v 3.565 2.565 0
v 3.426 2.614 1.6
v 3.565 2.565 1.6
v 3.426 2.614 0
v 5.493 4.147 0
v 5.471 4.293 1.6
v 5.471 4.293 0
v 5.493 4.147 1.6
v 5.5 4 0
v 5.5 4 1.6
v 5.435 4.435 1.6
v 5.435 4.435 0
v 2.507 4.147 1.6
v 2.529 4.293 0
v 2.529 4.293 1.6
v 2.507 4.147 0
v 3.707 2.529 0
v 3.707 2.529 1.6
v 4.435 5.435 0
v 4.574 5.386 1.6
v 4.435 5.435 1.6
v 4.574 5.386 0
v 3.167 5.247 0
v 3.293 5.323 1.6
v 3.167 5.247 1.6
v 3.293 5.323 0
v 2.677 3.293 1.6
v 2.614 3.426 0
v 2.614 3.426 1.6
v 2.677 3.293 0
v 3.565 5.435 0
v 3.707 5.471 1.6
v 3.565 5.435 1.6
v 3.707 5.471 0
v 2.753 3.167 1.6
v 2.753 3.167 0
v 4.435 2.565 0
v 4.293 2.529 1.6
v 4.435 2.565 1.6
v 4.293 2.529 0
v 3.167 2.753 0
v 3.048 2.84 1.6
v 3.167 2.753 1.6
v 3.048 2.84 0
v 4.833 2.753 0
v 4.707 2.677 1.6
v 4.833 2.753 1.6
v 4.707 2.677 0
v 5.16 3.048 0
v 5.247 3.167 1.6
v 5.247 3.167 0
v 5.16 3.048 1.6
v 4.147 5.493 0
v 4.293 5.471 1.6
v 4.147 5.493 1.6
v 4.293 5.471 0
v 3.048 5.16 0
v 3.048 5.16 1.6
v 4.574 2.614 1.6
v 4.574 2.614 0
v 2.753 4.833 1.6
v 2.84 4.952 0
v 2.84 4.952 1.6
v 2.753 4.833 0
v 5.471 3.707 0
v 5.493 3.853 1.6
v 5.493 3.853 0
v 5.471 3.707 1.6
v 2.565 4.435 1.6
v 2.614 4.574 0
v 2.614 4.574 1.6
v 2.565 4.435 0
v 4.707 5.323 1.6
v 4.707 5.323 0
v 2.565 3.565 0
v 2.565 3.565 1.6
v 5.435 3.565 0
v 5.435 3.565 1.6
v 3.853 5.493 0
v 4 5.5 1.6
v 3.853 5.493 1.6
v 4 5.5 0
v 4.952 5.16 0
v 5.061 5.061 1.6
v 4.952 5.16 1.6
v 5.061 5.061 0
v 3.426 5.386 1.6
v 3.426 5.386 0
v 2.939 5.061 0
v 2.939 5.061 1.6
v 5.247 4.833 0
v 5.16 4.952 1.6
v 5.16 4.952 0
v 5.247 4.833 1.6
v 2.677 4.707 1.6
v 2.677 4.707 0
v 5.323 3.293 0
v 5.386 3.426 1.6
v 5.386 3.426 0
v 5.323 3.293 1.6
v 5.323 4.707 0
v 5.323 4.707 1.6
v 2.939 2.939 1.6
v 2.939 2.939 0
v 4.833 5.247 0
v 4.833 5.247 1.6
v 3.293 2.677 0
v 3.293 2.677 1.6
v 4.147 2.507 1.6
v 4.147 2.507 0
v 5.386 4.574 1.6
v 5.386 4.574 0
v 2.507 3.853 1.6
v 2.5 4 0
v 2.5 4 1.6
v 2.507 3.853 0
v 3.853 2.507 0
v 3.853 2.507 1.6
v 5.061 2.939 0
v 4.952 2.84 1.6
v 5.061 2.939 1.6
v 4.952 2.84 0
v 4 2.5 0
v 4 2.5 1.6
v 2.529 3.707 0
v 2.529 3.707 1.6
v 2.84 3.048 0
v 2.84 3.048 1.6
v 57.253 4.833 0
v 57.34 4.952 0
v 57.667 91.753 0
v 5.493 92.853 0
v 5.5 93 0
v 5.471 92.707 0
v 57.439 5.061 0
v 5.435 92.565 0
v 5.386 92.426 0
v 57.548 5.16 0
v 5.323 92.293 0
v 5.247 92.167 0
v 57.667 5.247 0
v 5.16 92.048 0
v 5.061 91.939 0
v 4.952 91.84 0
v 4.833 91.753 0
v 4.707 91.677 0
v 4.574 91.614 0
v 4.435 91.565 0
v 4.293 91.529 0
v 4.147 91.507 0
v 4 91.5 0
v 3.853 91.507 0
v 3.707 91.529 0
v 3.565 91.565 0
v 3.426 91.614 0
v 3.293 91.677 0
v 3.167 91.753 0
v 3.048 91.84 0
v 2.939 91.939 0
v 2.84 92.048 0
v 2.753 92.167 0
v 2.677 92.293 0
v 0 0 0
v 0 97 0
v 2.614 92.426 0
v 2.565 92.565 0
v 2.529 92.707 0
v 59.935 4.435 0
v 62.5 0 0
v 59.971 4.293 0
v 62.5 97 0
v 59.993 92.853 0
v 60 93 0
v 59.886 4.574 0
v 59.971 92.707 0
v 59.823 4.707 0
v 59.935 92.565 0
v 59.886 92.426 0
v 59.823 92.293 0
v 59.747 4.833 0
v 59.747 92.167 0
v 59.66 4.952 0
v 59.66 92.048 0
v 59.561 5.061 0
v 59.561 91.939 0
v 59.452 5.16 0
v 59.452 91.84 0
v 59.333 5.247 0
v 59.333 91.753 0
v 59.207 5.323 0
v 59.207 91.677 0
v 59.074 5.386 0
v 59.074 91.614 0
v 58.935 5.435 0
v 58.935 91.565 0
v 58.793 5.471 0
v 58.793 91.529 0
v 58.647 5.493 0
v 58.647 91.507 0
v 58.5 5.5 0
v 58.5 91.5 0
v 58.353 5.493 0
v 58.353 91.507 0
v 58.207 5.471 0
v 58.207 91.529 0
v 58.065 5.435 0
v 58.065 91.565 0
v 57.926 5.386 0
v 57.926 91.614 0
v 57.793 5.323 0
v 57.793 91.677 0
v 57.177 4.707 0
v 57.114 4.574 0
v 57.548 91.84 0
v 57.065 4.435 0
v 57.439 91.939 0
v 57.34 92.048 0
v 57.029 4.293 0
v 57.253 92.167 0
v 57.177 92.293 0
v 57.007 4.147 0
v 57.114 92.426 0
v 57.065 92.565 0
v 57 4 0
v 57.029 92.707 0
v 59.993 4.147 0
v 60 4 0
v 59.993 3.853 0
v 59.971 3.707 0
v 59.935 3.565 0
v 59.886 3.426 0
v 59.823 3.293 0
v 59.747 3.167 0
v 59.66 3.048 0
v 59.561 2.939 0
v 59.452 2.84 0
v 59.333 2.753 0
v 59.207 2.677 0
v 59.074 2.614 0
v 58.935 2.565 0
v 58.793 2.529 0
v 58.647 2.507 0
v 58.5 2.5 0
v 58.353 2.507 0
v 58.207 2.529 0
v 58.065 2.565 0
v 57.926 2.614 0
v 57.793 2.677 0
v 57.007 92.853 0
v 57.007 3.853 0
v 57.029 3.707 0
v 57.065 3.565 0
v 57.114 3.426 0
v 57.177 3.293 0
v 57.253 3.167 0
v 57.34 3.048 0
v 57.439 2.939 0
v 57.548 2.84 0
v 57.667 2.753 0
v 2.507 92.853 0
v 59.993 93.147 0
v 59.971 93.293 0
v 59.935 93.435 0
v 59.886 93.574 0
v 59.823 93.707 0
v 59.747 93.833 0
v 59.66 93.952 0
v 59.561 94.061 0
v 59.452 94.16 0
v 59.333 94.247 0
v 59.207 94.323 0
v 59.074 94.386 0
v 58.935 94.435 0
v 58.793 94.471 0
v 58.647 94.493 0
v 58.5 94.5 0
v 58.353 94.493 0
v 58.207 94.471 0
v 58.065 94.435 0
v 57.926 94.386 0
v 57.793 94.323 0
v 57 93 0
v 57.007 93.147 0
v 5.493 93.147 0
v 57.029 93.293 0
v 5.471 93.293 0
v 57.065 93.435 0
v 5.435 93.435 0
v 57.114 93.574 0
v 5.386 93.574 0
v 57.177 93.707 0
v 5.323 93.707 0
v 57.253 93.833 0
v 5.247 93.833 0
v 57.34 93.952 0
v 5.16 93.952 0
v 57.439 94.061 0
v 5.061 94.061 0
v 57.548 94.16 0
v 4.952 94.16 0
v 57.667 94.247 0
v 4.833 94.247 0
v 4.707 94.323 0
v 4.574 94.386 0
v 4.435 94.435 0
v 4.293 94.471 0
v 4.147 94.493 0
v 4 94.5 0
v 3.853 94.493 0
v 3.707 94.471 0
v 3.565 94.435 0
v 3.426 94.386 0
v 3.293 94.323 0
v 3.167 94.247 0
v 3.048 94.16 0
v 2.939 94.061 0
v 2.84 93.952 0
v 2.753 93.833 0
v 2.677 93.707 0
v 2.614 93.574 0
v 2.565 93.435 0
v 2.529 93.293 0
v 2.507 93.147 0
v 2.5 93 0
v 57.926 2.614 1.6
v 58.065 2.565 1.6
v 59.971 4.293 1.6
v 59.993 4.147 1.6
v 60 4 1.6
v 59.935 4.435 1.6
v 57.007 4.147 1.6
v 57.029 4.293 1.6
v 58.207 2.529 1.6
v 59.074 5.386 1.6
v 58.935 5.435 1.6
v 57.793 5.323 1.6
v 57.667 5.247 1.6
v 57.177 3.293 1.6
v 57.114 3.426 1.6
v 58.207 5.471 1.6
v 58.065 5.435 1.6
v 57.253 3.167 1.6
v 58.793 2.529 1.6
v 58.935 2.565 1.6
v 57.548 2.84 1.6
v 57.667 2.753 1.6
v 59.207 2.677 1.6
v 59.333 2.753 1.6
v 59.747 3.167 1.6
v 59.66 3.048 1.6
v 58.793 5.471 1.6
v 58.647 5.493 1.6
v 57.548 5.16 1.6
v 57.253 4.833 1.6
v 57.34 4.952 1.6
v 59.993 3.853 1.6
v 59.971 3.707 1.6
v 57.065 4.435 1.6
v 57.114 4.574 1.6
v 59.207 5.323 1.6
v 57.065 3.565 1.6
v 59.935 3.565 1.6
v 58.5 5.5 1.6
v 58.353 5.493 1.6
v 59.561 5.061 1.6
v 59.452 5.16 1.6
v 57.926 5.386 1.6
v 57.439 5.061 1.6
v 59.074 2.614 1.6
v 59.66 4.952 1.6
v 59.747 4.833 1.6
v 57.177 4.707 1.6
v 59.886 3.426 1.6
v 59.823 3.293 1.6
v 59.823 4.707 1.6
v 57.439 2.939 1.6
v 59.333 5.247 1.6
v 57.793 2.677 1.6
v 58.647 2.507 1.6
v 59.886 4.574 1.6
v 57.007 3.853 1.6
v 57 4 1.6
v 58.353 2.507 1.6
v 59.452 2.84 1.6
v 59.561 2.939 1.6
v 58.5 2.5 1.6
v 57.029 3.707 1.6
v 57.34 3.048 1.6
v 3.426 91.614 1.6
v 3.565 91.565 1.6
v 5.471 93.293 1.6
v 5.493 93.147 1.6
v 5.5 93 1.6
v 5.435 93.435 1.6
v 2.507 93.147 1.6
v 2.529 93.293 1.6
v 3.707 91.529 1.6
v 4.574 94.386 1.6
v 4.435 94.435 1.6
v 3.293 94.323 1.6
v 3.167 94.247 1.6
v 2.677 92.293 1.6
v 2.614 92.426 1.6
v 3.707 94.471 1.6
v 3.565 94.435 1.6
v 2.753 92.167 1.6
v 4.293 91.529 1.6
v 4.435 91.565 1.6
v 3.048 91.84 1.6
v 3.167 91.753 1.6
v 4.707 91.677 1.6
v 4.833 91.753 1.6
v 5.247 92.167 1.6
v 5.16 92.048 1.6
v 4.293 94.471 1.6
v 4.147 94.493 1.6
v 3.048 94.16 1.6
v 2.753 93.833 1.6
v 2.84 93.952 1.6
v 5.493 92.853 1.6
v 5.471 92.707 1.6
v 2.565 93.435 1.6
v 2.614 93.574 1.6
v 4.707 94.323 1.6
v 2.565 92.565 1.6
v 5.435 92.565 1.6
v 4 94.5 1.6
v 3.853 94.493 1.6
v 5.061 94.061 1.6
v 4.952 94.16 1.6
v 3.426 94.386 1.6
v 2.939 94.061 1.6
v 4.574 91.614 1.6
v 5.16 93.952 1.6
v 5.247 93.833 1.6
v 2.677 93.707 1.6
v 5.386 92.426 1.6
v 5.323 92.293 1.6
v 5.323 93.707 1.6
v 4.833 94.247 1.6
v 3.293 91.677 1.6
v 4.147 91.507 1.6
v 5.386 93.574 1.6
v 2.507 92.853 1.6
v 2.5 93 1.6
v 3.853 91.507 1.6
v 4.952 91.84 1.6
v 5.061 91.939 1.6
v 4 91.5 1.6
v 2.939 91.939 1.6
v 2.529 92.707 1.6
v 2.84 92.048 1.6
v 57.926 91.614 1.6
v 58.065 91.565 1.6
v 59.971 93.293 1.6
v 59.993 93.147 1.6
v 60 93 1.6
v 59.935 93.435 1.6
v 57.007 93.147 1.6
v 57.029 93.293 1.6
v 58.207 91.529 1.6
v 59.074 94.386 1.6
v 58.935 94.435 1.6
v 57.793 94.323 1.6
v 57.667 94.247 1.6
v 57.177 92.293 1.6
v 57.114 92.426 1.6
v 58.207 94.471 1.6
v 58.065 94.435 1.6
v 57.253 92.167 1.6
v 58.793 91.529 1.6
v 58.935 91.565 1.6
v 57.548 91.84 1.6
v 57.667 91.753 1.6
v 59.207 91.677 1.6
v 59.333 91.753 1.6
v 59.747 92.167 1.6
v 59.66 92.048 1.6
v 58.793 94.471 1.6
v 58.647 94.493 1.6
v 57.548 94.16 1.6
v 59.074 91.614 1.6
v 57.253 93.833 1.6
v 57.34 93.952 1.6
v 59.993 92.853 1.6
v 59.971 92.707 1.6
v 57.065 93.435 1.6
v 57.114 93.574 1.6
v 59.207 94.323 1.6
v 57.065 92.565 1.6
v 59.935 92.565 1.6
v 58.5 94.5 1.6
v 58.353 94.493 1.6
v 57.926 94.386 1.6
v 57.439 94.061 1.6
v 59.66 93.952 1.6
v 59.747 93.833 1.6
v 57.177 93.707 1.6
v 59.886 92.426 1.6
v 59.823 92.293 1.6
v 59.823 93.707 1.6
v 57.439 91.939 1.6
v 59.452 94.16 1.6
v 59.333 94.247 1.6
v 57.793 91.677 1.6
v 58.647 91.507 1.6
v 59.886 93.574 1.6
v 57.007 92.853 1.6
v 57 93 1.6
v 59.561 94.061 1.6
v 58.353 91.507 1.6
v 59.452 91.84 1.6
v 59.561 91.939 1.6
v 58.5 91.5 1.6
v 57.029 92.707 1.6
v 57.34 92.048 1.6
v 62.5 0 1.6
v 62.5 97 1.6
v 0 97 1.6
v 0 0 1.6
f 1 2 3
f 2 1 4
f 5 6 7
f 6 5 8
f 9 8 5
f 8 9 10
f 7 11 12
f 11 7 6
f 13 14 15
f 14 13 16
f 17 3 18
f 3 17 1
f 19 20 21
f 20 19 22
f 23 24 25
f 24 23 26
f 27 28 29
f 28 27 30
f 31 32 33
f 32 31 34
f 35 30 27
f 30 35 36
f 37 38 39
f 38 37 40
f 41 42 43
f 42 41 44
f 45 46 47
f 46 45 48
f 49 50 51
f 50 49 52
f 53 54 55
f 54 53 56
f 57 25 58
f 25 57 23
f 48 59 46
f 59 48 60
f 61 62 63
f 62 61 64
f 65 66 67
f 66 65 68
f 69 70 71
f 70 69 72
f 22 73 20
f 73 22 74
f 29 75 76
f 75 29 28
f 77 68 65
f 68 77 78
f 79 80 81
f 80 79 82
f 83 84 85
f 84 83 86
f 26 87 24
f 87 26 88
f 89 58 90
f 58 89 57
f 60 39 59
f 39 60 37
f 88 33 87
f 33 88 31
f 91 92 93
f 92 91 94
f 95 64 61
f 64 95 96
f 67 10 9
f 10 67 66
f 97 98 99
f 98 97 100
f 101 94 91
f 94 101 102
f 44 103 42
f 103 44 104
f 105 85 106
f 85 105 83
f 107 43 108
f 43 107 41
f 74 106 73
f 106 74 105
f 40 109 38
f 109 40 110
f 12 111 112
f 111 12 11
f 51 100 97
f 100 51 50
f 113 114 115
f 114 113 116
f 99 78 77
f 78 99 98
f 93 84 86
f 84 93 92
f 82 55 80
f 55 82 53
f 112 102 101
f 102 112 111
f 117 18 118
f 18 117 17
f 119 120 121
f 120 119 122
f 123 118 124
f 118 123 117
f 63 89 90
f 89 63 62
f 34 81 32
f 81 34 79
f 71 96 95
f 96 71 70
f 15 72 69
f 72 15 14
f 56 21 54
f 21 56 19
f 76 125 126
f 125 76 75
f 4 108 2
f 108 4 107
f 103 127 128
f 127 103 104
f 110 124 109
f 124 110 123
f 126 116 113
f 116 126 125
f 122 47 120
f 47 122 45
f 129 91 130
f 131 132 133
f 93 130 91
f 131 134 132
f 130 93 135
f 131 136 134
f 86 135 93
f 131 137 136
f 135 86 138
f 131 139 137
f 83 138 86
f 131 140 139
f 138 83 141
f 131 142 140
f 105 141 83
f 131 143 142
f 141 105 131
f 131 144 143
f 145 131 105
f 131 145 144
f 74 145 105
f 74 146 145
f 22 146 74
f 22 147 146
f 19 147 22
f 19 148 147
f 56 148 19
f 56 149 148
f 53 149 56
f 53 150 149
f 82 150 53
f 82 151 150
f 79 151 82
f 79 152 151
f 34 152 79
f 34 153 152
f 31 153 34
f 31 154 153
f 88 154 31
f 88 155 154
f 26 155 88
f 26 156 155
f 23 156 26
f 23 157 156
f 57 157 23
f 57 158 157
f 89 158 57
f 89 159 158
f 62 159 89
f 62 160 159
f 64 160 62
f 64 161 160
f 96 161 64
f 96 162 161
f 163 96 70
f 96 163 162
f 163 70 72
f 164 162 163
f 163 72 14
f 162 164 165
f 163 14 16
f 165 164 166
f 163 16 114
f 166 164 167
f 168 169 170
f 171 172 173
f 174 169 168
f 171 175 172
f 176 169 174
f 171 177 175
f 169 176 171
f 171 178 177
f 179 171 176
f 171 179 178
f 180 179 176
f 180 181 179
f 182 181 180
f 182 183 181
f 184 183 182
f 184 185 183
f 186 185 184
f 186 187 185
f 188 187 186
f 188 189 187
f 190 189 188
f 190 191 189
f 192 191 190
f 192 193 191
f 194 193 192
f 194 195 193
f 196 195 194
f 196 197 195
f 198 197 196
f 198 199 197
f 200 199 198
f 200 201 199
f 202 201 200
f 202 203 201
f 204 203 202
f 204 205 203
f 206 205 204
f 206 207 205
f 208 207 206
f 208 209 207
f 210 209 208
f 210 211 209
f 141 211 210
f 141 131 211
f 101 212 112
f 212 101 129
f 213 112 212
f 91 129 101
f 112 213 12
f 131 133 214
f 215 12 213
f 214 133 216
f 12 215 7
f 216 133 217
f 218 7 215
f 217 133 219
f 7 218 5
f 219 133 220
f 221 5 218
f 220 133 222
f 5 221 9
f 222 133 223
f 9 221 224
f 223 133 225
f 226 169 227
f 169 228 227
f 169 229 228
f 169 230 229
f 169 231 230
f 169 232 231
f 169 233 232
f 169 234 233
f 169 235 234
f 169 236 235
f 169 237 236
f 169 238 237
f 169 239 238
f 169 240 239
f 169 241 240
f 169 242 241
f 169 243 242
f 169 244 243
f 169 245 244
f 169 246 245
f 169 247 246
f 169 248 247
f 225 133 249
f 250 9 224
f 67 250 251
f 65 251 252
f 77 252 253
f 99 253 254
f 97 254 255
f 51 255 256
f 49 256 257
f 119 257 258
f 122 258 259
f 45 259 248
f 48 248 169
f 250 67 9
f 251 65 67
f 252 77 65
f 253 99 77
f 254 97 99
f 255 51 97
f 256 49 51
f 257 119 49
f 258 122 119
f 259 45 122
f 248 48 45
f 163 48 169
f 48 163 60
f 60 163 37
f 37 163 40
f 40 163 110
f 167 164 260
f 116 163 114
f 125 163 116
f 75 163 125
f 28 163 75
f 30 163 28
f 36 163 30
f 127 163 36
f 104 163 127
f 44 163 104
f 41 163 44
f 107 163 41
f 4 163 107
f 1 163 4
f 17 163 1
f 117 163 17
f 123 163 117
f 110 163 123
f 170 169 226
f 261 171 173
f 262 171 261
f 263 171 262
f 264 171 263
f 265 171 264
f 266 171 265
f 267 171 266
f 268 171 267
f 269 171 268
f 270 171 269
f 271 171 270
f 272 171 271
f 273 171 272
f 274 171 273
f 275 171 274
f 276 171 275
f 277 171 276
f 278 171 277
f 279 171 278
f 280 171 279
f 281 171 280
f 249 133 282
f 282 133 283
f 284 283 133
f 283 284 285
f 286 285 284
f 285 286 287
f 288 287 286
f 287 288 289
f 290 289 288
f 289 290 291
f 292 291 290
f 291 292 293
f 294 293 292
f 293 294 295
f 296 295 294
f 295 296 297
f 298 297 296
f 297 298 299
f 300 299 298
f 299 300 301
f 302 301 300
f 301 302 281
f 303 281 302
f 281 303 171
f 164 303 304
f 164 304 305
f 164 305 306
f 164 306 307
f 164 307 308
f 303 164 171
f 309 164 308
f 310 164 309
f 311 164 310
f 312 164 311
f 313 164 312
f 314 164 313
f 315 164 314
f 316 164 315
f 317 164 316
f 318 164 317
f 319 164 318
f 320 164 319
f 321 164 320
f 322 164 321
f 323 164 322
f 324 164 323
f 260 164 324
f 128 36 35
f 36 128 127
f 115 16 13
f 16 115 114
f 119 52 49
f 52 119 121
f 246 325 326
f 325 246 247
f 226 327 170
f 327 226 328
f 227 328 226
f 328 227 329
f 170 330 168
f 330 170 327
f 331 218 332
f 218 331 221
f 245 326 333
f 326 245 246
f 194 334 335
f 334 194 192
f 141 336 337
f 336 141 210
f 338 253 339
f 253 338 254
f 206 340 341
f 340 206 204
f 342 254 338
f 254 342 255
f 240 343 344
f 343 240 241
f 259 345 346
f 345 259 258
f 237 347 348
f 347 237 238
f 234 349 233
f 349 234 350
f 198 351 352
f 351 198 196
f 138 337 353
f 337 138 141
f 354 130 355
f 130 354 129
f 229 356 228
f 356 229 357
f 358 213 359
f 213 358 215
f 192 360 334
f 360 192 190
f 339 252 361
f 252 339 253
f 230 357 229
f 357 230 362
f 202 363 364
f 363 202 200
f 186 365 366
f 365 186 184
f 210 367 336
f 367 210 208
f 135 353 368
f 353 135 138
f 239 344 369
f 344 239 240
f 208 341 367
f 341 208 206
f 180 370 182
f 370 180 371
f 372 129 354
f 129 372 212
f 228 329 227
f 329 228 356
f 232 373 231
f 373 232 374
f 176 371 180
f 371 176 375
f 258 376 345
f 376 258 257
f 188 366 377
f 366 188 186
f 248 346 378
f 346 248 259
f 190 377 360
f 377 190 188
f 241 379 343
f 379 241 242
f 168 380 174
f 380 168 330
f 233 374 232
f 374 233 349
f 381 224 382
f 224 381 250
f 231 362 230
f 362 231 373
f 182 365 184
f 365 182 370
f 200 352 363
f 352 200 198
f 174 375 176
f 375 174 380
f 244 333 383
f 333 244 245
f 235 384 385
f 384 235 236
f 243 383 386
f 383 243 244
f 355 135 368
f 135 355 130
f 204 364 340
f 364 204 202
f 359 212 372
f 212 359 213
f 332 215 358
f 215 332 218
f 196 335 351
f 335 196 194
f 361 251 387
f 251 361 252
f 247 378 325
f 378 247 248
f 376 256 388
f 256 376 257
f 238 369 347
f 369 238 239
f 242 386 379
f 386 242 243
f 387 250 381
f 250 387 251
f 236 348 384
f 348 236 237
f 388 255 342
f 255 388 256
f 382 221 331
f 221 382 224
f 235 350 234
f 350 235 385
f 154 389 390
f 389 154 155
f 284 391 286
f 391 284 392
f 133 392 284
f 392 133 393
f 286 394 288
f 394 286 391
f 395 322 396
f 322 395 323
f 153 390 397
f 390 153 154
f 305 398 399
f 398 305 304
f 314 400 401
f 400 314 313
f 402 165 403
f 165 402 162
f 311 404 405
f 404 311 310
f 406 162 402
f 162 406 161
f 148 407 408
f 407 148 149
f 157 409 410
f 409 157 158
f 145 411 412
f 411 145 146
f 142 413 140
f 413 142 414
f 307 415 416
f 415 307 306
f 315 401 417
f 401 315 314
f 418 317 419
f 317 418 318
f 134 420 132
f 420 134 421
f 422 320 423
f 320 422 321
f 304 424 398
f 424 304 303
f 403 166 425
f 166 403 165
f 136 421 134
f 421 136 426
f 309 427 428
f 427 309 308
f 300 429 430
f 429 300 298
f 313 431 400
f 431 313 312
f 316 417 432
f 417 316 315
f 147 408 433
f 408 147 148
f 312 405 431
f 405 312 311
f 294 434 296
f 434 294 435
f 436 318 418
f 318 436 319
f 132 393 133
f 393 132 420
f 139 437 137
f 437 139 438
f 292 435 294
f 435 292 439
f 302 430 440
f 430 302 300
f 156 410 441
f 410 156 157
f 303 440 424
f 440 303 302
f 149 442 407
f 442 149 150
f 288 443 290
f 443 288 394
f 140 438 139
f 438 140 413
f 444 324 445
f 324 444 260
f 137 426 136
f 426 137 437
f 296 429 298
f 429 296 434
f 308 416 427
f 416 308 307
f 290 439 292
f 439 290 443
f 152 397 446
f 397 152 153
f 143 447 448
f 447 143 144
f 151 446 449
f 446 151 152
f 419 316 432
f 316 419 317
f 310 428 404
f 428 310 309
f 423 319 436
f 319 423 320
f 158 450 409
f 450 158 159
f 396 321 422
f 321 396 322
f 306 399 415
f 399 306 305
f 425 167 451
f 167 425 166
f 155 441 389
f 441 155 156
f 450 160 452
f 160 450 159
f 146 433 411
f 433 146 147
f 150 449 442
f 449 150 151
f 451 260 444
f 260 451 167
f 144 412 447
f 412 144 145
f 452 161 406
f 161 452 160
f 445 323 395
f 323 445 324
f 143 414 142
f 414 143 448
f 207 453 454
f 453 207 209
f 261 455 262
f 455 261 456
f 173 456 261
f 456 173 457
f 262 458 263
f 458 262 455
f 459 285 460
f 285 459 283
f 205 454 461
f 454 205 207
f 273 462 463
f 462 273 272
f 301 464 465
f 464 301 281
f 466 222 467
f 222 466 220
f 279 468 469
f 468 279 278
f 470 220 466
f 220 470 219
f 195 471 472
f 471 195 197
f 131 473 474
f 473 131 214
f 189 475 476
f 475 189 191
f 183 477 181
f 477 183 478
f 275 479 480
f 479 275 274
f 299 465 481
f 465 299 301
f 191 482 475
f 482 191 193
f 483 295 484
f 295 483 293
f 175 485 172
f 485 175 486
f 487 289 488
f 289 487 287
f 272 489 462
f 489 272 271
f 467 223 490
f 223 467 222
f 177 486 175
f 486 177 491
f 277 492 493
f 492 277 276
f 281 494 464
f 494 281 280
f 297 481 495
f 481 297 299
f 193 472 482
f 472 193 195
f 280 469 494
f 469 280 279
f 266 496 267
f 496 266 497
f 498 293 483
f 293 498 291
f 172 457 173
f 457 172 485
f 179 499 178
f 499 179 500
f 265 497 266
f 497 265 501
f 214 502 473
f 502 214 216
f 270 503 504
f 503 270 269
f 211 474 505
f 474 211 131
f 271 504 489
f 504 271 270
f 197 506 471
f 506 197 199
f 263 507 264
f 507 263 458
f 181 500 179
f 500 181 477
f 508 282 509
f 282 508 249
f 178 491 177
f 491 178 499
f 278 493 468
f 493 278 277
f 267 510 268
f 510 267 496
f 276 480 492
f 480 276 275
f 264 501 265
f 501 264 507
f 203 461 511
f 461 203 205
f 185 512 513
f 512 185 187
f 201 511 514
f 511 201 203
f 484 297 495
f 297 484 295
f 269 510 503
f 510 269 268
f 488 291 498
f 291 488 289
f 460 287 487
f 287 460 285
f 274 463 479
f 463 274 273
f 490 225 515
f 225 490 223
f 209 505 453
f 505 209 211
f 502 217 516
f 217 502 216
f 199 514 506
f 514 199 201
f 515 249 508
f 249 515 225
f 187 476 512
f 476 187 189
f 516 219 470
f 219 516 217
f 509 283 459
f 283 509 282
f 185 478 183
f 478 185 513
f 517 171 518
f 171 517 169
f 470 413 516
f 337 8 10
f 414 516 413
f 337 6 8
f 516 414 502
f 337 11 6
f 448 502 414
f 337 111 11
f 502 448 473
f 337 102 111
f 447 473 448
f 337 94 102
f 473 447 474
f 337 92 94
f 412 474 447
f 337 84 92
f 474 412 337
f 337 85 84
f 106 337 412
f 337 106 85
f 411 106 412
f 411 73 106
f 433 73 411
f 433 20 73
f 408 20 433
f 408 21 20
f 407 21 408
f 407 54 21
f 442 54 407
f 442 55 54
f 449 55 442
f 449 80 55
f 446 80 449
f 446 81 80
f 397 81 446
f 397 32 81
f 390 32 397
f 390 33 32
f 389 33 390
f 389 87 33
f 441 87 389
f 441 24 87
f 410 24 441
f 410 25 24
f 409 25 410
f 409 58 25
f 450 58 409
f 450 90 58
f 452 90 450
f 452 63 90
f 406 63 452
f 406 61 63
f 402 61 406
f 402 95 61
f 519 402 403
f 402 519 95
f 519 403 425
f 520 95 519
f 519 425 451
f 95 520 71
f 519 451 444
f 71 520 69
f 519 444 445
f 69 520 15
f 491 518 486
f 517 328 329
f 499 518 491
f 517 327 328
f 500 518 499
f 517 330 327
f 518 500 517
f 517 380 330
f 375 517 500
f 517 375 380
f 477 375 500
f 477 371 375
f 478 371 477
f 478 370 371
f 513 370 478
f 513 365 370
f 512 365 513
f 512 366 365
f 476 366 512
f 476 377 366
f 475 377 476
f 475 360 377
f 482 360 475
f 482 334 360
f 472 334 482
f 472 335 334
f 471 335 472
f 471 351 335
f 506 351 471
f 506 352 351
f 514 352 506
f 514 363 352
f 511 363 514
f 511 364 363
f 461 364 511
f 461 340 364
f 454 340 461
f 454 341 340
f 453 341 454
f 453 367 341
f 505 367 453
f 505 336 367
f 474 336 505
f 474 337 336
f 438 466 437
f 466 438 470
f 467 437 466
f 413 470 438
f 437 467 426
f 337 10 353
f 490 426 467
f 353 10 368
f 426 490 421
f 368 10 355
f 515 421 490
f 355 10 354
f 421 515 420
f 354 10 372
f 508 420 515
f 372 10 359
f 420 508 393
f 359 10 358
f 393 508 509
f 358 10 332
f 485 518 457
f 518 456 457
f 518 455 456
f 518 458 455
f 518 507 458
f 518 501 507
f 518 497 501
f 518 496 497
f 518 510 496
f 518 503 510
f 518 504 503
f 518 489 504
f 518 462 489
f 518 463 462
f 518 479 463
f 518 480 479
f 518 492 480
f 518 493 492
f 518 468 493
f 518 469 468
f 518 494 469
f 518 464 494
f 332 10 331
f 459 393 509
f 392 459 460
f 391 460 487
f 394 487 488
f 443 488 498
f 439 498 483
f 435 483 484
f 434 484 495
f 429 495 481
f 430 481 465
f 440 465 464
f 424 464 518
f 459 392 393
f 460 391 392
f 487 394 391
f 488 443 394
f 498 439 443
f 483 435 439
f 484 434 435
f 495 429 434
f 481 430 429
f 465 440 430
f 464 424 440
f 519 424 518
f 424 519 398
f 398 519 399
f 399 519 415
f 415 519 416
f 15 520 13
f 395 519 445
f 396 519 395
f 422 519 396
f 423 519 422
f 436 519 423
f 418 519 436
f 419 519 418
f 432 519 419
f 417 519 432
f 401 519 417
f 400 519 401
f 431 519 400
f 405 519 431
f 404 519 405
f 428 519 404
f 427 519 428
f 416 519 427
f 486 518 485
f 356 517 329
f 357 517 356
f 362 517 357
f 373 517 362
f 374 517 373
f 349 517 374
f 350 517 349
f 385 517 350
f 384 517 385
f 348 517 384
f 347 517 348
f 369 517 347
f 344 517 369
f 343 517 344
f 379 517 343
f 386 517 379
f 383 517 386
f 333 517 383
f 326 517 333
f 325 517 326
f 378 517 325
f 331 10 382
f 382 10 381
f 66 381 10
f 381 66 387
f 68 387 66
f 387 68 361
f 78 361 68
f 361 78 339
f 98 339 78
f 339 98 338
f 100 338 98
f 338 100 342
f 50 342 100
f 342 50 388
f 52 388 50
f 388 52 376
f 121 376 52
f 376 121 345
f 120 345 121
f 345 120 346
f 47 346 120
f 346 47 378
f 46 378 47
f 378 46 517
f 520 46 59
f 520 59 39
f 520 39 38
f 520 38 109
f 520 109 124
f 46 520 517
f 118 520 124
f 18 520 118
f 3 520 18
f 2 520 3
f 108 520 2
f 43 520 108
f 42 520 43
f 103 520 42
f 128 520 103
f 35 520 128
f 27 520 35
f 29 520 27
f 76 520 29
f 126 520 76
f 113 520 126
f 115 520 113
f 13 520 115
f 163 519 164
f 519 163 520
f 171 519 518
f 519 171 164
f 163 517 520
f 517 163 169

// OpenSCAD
// file: printConfig.scad
/**********************************************************************************************************************
  Slack config to standardize different usages of slack/tolerance values.

  The purpose of this config is to introduce some consistency with how slack values defined in code. E.g. Why is the
  slack value defined as 0.3 in this file, but 0.4 in another? This will also allow model-level adjustments for tighter
  fitting parts, for when it might not convenient to adjust the actual 3d printer (using a 3d printer at a makerspace,
  for example).

  Some important details:
    - The general philosophy for slack applications in this project is to subtract space from sockets, while not
      modifying the plugs.
    - Values are signed. Positive values can be interpreted as how much to remove from the socket along some dimension.
    - These values depend on print orientation and it's assumed parts are printed in their recommended orientations.
*/
xySlack = 0.25;

radiusXYSlack = xySlack/2;

zSlack = 0.0;

overhangSlack = 0.5;

supportedOverhangSlack = 0.5;

// special slack cases, change if neccessary
xBarYBarDovetailSlack = xySlack;

/**********************************************************************************************************************
  Printer/slicer config, mainly used for calculating some special overhangs.
*/
defaultLayerHeight = 0.3;
// file: screws.scad
include <printConfig.scad>
include <math.scad>


/********************************************************************************/
// M3 dimensions
m3Diameter = 3.0;
m3Radius = m3Diameter / 2.0;
m3RadiusSlacked = m3Radius + radiusXYSlack;

m3CounterSunkHeadRadius = 3;
m3CounterSunkHeadLength = 1.7;

m3HexNutWidthAcrossFlats = 5.41;
m3HexNutWidthAcrossCorners = FtoG(m3HexNutWidthAcrossFlats);
m3HexNutThickness = 2.2;

/********************************************************************************/
// M4 dimensions
m4Diameter = 4.0;
m4Radius = m4Diameter / 2.0;
m4RadiusSlacked = m4Radius + radiusXYSlack;

m4CounterSunkHeadRadius = 4;
m4CounterSunkHeadLength = 2.3;

m4HexNutWidthAcrossFlats = 6.89;
m4HexNutWidthAcrossCorners = FtoG(m4HexNutWidthAcrossFlats);
m4HexNutThickness = 3.07;

/********************************************************************************/

function screwRadiusSlacked(screwType) =
  (screwType == "m3")
  ? m3RadiusSlacked
  : (screwType == "m4")
  ? m4RadiusSlacked
  : error("Unsupported screw type");

function hexNutThickness(screwType) =
  (screwType == "m3")
  ? m3HexNutThickness
  : (screwType == "m4")
  ? m4HexNutThickness
  : error("Unsupported screw type");


module counterSunkHead_N(screwType, screwExtension=0, headExtension=0) {

  if (screwType == "m3") {
    translate(v = [0, 0, -m3CounterSunkHeadLength])
    union() {
      cylinder(r1 = m3RadiusSlacked, r2 = m3CounterSunkHeadRadius, h = m3CounterSunkHeadLength);

      translate(v = [0, 0, -screwExtension])
      cylinder(r = m3RadiusSlacked, h = screwExtension);

      translate(v = [0, 0, m3CounterSunkHeadLength])
      cylinder(r = m3CounterSunkHeadRadius, h = headExtension);
    }
  } else if (screwType == "m4") {
    translate(v = [0, 0, -m4CounterSunkHeadLength])
    union() {
      cylinder(r1 = m4RadiusSlacked, r2 = m4CounterSunkHeadRadius, h = m4CounterSunkHeadLength);

      translate(v = [0, 0, -screwExtension])
      cylinder(r = m4RadiusSlacked, h = screwExtension);

      translate(v = [0, 0, m4CounterSunkHeadLength])
      cylinder(r = m4CounterSunkHeadRadius, h = headExtension);
    }
  } else {
    error("Unsupported screw type");
  }
}

module hexNut(screwType, center=true) {
  color([1, 1, 1])
  if (screwType == "m3") {
    translate(v = [0, 0,-m3HexNutThickness/2])
    difference() {
      cylinder(r=m3HexNutWidthAcrossCorners/2, h=m3HexNutThickness, $fn=6);
      cylinder(r=m3Radius,h=inf10, center=true);
    }
  } else if (screwType == "m4") {
    translate(v = [0, 0,-m4HexNutThickness/2])
    difference() {
      cylinder(r=m4HexNutWidthAcrossCorners/2, h=m4HexNutThickness, $fn=6);
      cylinder(r=m4Radius,h=inf10, center=true);
    }
  } else {
    error("Unsupported screw type");
  }
}

module hexNutPocket_N(screwType, openSide=true, backSpace=inf10, bridgeFront=false, bridgeBack=false ) {

  heightSlack = bridgeFront || bridgeBack ? overhangSlack: xySlack;

  if (screwType == "m3") {
    hexNutPocketHelper_N(m3RadiusSlacked, (m3HexNutWidthAcrossCorners+xySlack) / 2, m3HexNutThickness + heightSlack, openSide=openSide, backSpace=backSpace, bridgeFront=bridgeFront, bridgeBack=bridgeBack);
  } else if (screwType == "m4") {
    hexNutPocketHelper_N(m4RadiusSlacked, (m4HexNutWidthAcrossCorners+xySlack) / 2, m4HexNutThickness + heightSlack, openSide=openSide, backSpace=backSpace, bridgeFront=bridgeFront, bridgeBack=bridgeBack);
  } else {
    error("Unsupported screw type");
  }
}

// module hexNutPocketHelper_N(innerRadius, widthAcrossCorners, thickness, openSide=true, backSpace=inf10, bridgeFront=false, bridgeBack=false) {

//   assert (!(bridgeFront && bridgeBack));
//   assert (!(openSide && bridgeFront));

//   union() {
//     hull() {
//       // hexagonal prism representing where the nut should fit
//       cylinder(r = widthAcrossCorners, h = thickness, center = true, $fn = 6);

//       // negative volume for sliding in the nut
//       translate(v = [inf50, 0, 0])
//       cylinder(r = widthAcrossCorners, h = thickness, center = true, $fn = 6);
//     }

//     // negative volume for screw
//     union() {
//       // screw lead spacing
//       translate(v = [0, 0, -backSpace])
//       cylinder(r = innerRadius, h = backSpace, $fn = 32);

//       cylinder(r=innerRadius, h=inf50, $fn=32);

//       if (bridgeFront) {
//         union() {
//           // first bridge layer
//           translate(v=[0,0,thickness/2 + defaultLayerHeight/2])
//           cube(size=[2*innerRadius, GtoF(widthAcrossCorners)*2, defaultLayerHeight], center=true);
//           // second bridge layer
//           translate(v=[0,0,thickness/2 + defaultLayerHeight])
//           cube(size=[2*innerRadius, 2*innerRadius, defaultLayerHeight], center=true);
//         }
//       }

//       if (bridgeBack) {
//         union() {
//           // first bridge layer
//           translate(v=[0,0,-(thickness/2 + defaultLayerHeight/2)])
//           cube(size=[2*innerRadius, GtoF(widthAcrossCorners)*2, defaultLayerHeight], center=true);
//           // second bridge layer
//           translate(v=[0,0,-(thickness/2 + defaultLayerHeight)])
//           cube(size=[2*innerRadius, 2*innerRadius, defaultLayerHeight], center=true);
//         }
//       }
//     }

//     if (openSide) {
//       hull() {
//         translate(v = [inf50, 0, 0])
//         cylinder(r = innerRadius, h = inf50, $fn = 32);
//         cylinder(r = innerRadius, h = inf50, $fn = 32);
//       }
//     }
//   }



// Convert a regular hexagon widthAcrossFlats to widthAcrossCorners
function FtoG(widthAcrossFlats) = widthAcrossFlats * (2 / sqrt(3));

// Convert a regular hexagon widthAcrossCorners to widthAcrossFlats
function GtoF(widthAcrossCorners) = widthAcrossCorners * (sqrt(3) / 2);
// file: math.scad
$fn=64; // render quality
eps=0.01;
inf = 1000;

function unit(v) = v/norm(v);

function lerp(a, b, t) = (b * t + a * (1 - t));


/* Example usage:
for (i=mirror4XY(p=[0,0,0], dx=90, dy=90))
   { translate(v=i) something(); }
*/
module mirror4XY(p, dx, dy) {

    px = p[0];
    py = p[1];
    pz = p[2];

    translate(v=[px, py, pz])
    children(0);

    translate(v=[px+dx, py, pz])
    children(0);

    translate(v=[px, py+dy, pz])
    children(0);

    translate(v=[px+dx, py+dy, pz])
    children(0);
}


// Some matrix transformations

identity = [
    [1,0,0,0],
    [0,1,0,0],
    [0,0,1,0],
    [0,0,0,1],
  ];

function scale(v) = [
    [v[0],0,0,0],
    [0,v[1],0,0],
    [0,0,v[2],0],
    [0,0,0,1]
  ];

function rotatex(a) = [
    [1,0,0,0],
    [0,cos(a),-sin(a),0],
    [0,sin(a),cos(a),0],
    [0,0,0,1]
  ];

function rotatey(a) = [
    [cos(a),0,sin(a),0],
    [0,1,0,0],
    [-sin(a),0,cos(a),0],
    [0,0,0,1]
  ];

function rotatez(a) = [
    [cos(a),-sin(a),0,0],
    [sin(a),cos(a),0,0],
    [0,0,1,0],
    [0,0,0,1]
  ];

function rotate(a,v) =
  (v == undef)
  ? rotatez(a[2])*rotatey(a[1])*rotatex(a[0])
  : rotateanv(a,v/sqrt(v*v));

function translate(v) = [
    [1,0,0,v[0]],
    [0,1,0,v[1]],
    [0,0,1,v[2]],
    [0,0,0,1]
  ];

function mirrorabc(a,b,c) = [
    [1-2*a*a,-2*a*b,-2*a*c,0],
    [-2*a*b,1-2*b*b,-2*b*c,0],
    [-2*a*c,-2*b*c,1-2*c*c,0],
    [0,0,0,1]
  ];

function mirrornv(nv) = mirrorabc(nv[0],nv[1],nv[2]);

function mirror(v) = mirrornv(v/sqrt(v*v));


// taken from https://github.com/openscad/openscad/issues/1040#issuecomment-233208606
function det4x4(a) =
a[0][0]*a[1][1]*a[2][2]*a[3][3] + a[0][0]*a[1][2]*a[2][3]*a[3][1] + a[0][0]*a[1][3]*a[2][1]*a[3][2]
  + a[0][1]*a[1][0]*a[2][3]*a[3][2] + a[0][1]*a[1][2]*a[2][0]*a[3][3] + a[0][1]*a[1][3]*a[2][2]*a[3][0]
  + a[0][2]*a[1][0]*a[2][1]*a[3][3] + a[0][2]*a[1][1]*a[2][3]*a[3][0] + a[0][2]*a[1][3]*a[2][0]*a[3][1]
  + a[0][3]*a[1][0]*a[2][2]*a[3][1] + a[0][3]*a[1][1]*a[2][0]*a[3][2] + a[0][3]*a[1][2]*a[2][1]*a[3][0]
  - a[0][0]*a[1][1]*a[2][3]*a[3][2] - a[0][0]*a[1][2]*a[2][1]*a[3][3] - a[0][0]*a[1][3]*a[2][2]*a[3][1]
  - a[0][1]*a[1][0]*a[2][2]*a[3][3] - a[0][1]*a[1][2]*a[2][3]*a[3][0] - a[0][1]*a[1][3]*a[2][0]*a[3][2]
  - a[0][2]*a[1][0]*a[2][3]*a[3][1] - a[0][2]*a[1][1]*a[2][0]*a[3][3] - a[0][2]*a[1][3]*a[2][1]*a[3][0]
  - a[0][3]*a[1][0]*a[2][1]*a[3][2] - a[0][3]*a[1][1]*a[2][2]*a[3][0] - a[0][3]*a[1][2]*a[2][0]*a[3][1];

function invb00(a) = a[1][1]*a[2][2]*a[3][3] + a[1][2]*a[2][3]*a[3][1] + a[1][3]*a[2][1]*a[3][2] - a[1][1]*a[2][3]*a[3][2] - a[1][2]*a[2][1]*a[3][3] - a[1][3]*a[2][2]*a[3][1];

function invb01(a) = a[0][1]*a[2][3]*a[3][2] + a[0][2]*a[2][1]*a[3][3] + a[0][3]*a[2][2]*a[3][1] - a[0][1]*a[2][2]*a[3][3] - a[0][2]*a[2][3]*a[3][1] - a[0][3]*a[2][1]*a[3][2];

function invb02(a) = a[0][1]*a[1][2]*a[3][3] + a[0][2]*a[1][3]*a[3][1] + a[0][3]*a[1][1]*a[3][2] - a[0][1]*a[1][3]*a[3][2] - a[0][2]*a[1][1]*a[3][3] - a[0][3]*a[1][2]*a[3][1];

function invb03(a) = a[0][1]*a[1][3]*a[2][2] + a[0][2]*a[1][1]*a[2][3] + a[0][3]*a[1][2]*a[2][1] - a[0][1]*a[1][2]*a[2][3] - a[0][2]*a[1][3]*a[2][1] - a[0][3]*a[1][1]*a[2][2];

function invb10(a) = a[1][0]*a[2][3]*a[3][2] + a[1][2]*a[2][0]*a[3][3] + a[1][3]*a[2][2]*a[3][0] - a[1][0]*a[2][2]*a[3][3] - a[1][2]*a[2][3]*a[3][0] - a[1][3]*a[2][0]*a[3][2];

function invb11(a) = a[0][0]*a[2][2]*a[3][3] + a[0][2]*a[2][3]*a[3][0] + a[0][3]*a[2][0]*a[3][2] - a[0][0]*a[2][3]*a[3][2] - a[0][2]*a[2][0]*a[3][3] - a[0][3]*a[2][2]*a[3][0];

function invb12(a) = a[0][0]*a[1][3]*a[3][2] + a[0][2]*a[1][0]*a[3][3] + a[0][3]*a[1][2]*a[3][0] - a[0][0]*a[1][2]*a[3][3] - a[0][2]*a[1][3]*a[3][0] - a[0][3]*a[1][0]*a[3][2];

function invb13(a) = a[0][0]*a[1][2]*a[2][3] + a[0][2]*a[1][3]*a[2][0] + a[0][3]*a[1][0]*a[2][2] - a[0][0]*a[1][3]*a[2][2] - a[0][2]*a[1][0]*a[2][3] - a[0][3]*a[1][2]*a[2][0];

function invb20(a) = a[1][0]*a[2][1]*a[3][3] + a[1][1]*a[2][3]*a[3][0] + a[1][3]*a[2][0]*a[3][1] - a[1][0]*a[2][3]*a[3][1] - a[1][1]*a[2][0]*a[3][3] - a[1][3]*a[2][1]*a[3][0];

function invb21(a) = a[0][0]*a[2][3]*a[3][1] + a[0][1]*a[2][0]*a[3][3] + a[0][3]*a[2][1]*a[3][0] - a[0][0]*a[2][1]*a[3][3] - a[0][1]*a[2][3]*a[3][0] - a[0][3]*a[2][0]*a[3][1];

function invb22(a) = a[0][0]*a[1][1]*a[3][3] + a[0][1]*a[1][3]*a[3][0] + a[0][3]*a[1][0]*a[3][1] - a[0][0]*a[1][3]*a[3][1] - a[0][1]*a[1][0]*a[3][3] - a[0][3]*a[1][1]*a[3][0];

function invb23(a) = a[0][0]*a[1][3]*a[2][1] + a[0][1]*a[1][0]*a[2][3] + a[0][3]*a[1][1]*a[2][0] - a[0][0]*a[1][1]*a[2][3] - a[0][1]*a[1][3]*a[2][0] - a[0][3]*a[1][0]*a[2][1];

function invb30(a) = a[1][0]*a[2][2]*a[3][1] + a[1][1]*a[2][0]*a[3][2] + a[1][2]*a[2][1]*a[3][0] - a[1][0]*a[2][1]*a[3][2] - a[1][1]*a[2][2]*a[3][0] - a[1][2]*a[2][0]*a[3][1];

function invb31(a) = a[0][0]*a[2][1]*a[3][2] + a[0][1]*a[2][2]*a[3][0] + a[0][2]*a[2][0]*a[3][1] - a[0][0]*a[2][2]*a[3][1] - a[0][1]*a[2][0]*a[3][2] - a[0][2]*a[2][1]*a[3][0];

function invb32(a) = a[0][0]*a[1][2]*a[3][1] + a[0][1]*a[1][0]*a[3][2] + a[0][2]*a[1][1]*a[3][0] - a[0][0]*a[1][1]*a[3][2] - a[0][1]*a[1][2]*a[3][0] - a[0][2]*a[1][0]*a[3][1];

function invb33(a) = a[0][0]*a[1][1]*a[2][2] + a[0][1]*a[1][2]*a[2][0] + a[0][2]*a[1][0]*a[2][1] - a[0][0]*a[1][2]*a[2][1] - a[0][1]*a[1][0]*a[2][2] - a[0][2]*a[1][1]*a[2][0];

function inv4x4(a)= (1/det4x4(a))*[
    [invb00(a),invb01(a),invb02(a),invb03(a)],
    [invb10(a),invb11(a),invb12(a),invb13(a)],
    [invb20(a),invb21(a),invb22(a),invb23(a)],
    [invb30(a),invb31(a),invb32(a),invb33(a)]];
// file: dimensions.scad
/*

  Contains some the main case variables. These all exist within a single file, as most of these variables can have
  pretty complicated dependencies on other variables. For example, the size of the main board and thickness of the
  IO board directly affects the dimensions of the case.

  All dimensions are in millimetres, unless otherwise stated.
  
*/

// General PCB settings

pcbThickness = 1.6;

pcbMountHoleType = "m3";
pcbMountHoleDist = 4;  // X (or Y) distance between the midpoint of the pcb mount hole and the edge of the PCB.



// Main Board

mainBoardX = 62.5; // What "X" and "Y" values are are local to the main board module
mainBoardY = 97.0;

mainBoardBottomClearance = 6; // Here, the "bottom" is the bottom side where you solder the through hole components.

mainBoardScrewHoleDx = mainBoardX - 2*pcbMountHoleDist;
mainBoardScrewHoleDy = mainBoardY - 2*pcbMountHoleDist;

// IO Board

ioBoardX = 29.0;
ioBoardY = 97.0;

ioBoardBottomClearance = 5;

ioBoardScrewHoleDx = ioBoardX - 2*pcbMountHoleDist;
ioBoardScrewHoleDy = ioBoardY - 2*pcbMountHoleDist;


// Case values

wallThickness = 3;
pcbSpacing = 3;
// main file
include <dimensions.scad>
include <math.scad>
include <screws.scad>

module mainBoard(negative=false) {

    difference() {

        union() {
            color(c=[0.1,0.6,0.1]) // pcb green
                cube(size=[mainBoardX, mainBoardY, pcbThickness]);

            color(c=[1,0,0])
                if (negative) {

                    usbCutoutDx = 16;
                    usbCutoutX = 16;
                    usbCutoutZ = 10;

                    sdCutoutDx = 38;
                    sdCutoutX = 15;
                    sdCutoutZ = 10;

                    translate(v=[usbCutoutDx, mainBoardY, pcbThickness])
                        cube(size=[usbCutoutX, 25, usbCutoutZ]);

                    translate(v=[sdCutoutDx, mainBoardY, pcbThickness])
                        cube(size=[sdCutoutX, 25, sdCutoutZ]);
                
                }
        }

        mirror4XY(p=[pcbMountHoleDist,pcbMountHoleDist,0], dx=mainBoardScrewHoleDx, dy=mainBoardScrewHoleDy)
            cylinder(r=m3Radius, h=inf);

    }
    
}


mainBoard(negative=false);
